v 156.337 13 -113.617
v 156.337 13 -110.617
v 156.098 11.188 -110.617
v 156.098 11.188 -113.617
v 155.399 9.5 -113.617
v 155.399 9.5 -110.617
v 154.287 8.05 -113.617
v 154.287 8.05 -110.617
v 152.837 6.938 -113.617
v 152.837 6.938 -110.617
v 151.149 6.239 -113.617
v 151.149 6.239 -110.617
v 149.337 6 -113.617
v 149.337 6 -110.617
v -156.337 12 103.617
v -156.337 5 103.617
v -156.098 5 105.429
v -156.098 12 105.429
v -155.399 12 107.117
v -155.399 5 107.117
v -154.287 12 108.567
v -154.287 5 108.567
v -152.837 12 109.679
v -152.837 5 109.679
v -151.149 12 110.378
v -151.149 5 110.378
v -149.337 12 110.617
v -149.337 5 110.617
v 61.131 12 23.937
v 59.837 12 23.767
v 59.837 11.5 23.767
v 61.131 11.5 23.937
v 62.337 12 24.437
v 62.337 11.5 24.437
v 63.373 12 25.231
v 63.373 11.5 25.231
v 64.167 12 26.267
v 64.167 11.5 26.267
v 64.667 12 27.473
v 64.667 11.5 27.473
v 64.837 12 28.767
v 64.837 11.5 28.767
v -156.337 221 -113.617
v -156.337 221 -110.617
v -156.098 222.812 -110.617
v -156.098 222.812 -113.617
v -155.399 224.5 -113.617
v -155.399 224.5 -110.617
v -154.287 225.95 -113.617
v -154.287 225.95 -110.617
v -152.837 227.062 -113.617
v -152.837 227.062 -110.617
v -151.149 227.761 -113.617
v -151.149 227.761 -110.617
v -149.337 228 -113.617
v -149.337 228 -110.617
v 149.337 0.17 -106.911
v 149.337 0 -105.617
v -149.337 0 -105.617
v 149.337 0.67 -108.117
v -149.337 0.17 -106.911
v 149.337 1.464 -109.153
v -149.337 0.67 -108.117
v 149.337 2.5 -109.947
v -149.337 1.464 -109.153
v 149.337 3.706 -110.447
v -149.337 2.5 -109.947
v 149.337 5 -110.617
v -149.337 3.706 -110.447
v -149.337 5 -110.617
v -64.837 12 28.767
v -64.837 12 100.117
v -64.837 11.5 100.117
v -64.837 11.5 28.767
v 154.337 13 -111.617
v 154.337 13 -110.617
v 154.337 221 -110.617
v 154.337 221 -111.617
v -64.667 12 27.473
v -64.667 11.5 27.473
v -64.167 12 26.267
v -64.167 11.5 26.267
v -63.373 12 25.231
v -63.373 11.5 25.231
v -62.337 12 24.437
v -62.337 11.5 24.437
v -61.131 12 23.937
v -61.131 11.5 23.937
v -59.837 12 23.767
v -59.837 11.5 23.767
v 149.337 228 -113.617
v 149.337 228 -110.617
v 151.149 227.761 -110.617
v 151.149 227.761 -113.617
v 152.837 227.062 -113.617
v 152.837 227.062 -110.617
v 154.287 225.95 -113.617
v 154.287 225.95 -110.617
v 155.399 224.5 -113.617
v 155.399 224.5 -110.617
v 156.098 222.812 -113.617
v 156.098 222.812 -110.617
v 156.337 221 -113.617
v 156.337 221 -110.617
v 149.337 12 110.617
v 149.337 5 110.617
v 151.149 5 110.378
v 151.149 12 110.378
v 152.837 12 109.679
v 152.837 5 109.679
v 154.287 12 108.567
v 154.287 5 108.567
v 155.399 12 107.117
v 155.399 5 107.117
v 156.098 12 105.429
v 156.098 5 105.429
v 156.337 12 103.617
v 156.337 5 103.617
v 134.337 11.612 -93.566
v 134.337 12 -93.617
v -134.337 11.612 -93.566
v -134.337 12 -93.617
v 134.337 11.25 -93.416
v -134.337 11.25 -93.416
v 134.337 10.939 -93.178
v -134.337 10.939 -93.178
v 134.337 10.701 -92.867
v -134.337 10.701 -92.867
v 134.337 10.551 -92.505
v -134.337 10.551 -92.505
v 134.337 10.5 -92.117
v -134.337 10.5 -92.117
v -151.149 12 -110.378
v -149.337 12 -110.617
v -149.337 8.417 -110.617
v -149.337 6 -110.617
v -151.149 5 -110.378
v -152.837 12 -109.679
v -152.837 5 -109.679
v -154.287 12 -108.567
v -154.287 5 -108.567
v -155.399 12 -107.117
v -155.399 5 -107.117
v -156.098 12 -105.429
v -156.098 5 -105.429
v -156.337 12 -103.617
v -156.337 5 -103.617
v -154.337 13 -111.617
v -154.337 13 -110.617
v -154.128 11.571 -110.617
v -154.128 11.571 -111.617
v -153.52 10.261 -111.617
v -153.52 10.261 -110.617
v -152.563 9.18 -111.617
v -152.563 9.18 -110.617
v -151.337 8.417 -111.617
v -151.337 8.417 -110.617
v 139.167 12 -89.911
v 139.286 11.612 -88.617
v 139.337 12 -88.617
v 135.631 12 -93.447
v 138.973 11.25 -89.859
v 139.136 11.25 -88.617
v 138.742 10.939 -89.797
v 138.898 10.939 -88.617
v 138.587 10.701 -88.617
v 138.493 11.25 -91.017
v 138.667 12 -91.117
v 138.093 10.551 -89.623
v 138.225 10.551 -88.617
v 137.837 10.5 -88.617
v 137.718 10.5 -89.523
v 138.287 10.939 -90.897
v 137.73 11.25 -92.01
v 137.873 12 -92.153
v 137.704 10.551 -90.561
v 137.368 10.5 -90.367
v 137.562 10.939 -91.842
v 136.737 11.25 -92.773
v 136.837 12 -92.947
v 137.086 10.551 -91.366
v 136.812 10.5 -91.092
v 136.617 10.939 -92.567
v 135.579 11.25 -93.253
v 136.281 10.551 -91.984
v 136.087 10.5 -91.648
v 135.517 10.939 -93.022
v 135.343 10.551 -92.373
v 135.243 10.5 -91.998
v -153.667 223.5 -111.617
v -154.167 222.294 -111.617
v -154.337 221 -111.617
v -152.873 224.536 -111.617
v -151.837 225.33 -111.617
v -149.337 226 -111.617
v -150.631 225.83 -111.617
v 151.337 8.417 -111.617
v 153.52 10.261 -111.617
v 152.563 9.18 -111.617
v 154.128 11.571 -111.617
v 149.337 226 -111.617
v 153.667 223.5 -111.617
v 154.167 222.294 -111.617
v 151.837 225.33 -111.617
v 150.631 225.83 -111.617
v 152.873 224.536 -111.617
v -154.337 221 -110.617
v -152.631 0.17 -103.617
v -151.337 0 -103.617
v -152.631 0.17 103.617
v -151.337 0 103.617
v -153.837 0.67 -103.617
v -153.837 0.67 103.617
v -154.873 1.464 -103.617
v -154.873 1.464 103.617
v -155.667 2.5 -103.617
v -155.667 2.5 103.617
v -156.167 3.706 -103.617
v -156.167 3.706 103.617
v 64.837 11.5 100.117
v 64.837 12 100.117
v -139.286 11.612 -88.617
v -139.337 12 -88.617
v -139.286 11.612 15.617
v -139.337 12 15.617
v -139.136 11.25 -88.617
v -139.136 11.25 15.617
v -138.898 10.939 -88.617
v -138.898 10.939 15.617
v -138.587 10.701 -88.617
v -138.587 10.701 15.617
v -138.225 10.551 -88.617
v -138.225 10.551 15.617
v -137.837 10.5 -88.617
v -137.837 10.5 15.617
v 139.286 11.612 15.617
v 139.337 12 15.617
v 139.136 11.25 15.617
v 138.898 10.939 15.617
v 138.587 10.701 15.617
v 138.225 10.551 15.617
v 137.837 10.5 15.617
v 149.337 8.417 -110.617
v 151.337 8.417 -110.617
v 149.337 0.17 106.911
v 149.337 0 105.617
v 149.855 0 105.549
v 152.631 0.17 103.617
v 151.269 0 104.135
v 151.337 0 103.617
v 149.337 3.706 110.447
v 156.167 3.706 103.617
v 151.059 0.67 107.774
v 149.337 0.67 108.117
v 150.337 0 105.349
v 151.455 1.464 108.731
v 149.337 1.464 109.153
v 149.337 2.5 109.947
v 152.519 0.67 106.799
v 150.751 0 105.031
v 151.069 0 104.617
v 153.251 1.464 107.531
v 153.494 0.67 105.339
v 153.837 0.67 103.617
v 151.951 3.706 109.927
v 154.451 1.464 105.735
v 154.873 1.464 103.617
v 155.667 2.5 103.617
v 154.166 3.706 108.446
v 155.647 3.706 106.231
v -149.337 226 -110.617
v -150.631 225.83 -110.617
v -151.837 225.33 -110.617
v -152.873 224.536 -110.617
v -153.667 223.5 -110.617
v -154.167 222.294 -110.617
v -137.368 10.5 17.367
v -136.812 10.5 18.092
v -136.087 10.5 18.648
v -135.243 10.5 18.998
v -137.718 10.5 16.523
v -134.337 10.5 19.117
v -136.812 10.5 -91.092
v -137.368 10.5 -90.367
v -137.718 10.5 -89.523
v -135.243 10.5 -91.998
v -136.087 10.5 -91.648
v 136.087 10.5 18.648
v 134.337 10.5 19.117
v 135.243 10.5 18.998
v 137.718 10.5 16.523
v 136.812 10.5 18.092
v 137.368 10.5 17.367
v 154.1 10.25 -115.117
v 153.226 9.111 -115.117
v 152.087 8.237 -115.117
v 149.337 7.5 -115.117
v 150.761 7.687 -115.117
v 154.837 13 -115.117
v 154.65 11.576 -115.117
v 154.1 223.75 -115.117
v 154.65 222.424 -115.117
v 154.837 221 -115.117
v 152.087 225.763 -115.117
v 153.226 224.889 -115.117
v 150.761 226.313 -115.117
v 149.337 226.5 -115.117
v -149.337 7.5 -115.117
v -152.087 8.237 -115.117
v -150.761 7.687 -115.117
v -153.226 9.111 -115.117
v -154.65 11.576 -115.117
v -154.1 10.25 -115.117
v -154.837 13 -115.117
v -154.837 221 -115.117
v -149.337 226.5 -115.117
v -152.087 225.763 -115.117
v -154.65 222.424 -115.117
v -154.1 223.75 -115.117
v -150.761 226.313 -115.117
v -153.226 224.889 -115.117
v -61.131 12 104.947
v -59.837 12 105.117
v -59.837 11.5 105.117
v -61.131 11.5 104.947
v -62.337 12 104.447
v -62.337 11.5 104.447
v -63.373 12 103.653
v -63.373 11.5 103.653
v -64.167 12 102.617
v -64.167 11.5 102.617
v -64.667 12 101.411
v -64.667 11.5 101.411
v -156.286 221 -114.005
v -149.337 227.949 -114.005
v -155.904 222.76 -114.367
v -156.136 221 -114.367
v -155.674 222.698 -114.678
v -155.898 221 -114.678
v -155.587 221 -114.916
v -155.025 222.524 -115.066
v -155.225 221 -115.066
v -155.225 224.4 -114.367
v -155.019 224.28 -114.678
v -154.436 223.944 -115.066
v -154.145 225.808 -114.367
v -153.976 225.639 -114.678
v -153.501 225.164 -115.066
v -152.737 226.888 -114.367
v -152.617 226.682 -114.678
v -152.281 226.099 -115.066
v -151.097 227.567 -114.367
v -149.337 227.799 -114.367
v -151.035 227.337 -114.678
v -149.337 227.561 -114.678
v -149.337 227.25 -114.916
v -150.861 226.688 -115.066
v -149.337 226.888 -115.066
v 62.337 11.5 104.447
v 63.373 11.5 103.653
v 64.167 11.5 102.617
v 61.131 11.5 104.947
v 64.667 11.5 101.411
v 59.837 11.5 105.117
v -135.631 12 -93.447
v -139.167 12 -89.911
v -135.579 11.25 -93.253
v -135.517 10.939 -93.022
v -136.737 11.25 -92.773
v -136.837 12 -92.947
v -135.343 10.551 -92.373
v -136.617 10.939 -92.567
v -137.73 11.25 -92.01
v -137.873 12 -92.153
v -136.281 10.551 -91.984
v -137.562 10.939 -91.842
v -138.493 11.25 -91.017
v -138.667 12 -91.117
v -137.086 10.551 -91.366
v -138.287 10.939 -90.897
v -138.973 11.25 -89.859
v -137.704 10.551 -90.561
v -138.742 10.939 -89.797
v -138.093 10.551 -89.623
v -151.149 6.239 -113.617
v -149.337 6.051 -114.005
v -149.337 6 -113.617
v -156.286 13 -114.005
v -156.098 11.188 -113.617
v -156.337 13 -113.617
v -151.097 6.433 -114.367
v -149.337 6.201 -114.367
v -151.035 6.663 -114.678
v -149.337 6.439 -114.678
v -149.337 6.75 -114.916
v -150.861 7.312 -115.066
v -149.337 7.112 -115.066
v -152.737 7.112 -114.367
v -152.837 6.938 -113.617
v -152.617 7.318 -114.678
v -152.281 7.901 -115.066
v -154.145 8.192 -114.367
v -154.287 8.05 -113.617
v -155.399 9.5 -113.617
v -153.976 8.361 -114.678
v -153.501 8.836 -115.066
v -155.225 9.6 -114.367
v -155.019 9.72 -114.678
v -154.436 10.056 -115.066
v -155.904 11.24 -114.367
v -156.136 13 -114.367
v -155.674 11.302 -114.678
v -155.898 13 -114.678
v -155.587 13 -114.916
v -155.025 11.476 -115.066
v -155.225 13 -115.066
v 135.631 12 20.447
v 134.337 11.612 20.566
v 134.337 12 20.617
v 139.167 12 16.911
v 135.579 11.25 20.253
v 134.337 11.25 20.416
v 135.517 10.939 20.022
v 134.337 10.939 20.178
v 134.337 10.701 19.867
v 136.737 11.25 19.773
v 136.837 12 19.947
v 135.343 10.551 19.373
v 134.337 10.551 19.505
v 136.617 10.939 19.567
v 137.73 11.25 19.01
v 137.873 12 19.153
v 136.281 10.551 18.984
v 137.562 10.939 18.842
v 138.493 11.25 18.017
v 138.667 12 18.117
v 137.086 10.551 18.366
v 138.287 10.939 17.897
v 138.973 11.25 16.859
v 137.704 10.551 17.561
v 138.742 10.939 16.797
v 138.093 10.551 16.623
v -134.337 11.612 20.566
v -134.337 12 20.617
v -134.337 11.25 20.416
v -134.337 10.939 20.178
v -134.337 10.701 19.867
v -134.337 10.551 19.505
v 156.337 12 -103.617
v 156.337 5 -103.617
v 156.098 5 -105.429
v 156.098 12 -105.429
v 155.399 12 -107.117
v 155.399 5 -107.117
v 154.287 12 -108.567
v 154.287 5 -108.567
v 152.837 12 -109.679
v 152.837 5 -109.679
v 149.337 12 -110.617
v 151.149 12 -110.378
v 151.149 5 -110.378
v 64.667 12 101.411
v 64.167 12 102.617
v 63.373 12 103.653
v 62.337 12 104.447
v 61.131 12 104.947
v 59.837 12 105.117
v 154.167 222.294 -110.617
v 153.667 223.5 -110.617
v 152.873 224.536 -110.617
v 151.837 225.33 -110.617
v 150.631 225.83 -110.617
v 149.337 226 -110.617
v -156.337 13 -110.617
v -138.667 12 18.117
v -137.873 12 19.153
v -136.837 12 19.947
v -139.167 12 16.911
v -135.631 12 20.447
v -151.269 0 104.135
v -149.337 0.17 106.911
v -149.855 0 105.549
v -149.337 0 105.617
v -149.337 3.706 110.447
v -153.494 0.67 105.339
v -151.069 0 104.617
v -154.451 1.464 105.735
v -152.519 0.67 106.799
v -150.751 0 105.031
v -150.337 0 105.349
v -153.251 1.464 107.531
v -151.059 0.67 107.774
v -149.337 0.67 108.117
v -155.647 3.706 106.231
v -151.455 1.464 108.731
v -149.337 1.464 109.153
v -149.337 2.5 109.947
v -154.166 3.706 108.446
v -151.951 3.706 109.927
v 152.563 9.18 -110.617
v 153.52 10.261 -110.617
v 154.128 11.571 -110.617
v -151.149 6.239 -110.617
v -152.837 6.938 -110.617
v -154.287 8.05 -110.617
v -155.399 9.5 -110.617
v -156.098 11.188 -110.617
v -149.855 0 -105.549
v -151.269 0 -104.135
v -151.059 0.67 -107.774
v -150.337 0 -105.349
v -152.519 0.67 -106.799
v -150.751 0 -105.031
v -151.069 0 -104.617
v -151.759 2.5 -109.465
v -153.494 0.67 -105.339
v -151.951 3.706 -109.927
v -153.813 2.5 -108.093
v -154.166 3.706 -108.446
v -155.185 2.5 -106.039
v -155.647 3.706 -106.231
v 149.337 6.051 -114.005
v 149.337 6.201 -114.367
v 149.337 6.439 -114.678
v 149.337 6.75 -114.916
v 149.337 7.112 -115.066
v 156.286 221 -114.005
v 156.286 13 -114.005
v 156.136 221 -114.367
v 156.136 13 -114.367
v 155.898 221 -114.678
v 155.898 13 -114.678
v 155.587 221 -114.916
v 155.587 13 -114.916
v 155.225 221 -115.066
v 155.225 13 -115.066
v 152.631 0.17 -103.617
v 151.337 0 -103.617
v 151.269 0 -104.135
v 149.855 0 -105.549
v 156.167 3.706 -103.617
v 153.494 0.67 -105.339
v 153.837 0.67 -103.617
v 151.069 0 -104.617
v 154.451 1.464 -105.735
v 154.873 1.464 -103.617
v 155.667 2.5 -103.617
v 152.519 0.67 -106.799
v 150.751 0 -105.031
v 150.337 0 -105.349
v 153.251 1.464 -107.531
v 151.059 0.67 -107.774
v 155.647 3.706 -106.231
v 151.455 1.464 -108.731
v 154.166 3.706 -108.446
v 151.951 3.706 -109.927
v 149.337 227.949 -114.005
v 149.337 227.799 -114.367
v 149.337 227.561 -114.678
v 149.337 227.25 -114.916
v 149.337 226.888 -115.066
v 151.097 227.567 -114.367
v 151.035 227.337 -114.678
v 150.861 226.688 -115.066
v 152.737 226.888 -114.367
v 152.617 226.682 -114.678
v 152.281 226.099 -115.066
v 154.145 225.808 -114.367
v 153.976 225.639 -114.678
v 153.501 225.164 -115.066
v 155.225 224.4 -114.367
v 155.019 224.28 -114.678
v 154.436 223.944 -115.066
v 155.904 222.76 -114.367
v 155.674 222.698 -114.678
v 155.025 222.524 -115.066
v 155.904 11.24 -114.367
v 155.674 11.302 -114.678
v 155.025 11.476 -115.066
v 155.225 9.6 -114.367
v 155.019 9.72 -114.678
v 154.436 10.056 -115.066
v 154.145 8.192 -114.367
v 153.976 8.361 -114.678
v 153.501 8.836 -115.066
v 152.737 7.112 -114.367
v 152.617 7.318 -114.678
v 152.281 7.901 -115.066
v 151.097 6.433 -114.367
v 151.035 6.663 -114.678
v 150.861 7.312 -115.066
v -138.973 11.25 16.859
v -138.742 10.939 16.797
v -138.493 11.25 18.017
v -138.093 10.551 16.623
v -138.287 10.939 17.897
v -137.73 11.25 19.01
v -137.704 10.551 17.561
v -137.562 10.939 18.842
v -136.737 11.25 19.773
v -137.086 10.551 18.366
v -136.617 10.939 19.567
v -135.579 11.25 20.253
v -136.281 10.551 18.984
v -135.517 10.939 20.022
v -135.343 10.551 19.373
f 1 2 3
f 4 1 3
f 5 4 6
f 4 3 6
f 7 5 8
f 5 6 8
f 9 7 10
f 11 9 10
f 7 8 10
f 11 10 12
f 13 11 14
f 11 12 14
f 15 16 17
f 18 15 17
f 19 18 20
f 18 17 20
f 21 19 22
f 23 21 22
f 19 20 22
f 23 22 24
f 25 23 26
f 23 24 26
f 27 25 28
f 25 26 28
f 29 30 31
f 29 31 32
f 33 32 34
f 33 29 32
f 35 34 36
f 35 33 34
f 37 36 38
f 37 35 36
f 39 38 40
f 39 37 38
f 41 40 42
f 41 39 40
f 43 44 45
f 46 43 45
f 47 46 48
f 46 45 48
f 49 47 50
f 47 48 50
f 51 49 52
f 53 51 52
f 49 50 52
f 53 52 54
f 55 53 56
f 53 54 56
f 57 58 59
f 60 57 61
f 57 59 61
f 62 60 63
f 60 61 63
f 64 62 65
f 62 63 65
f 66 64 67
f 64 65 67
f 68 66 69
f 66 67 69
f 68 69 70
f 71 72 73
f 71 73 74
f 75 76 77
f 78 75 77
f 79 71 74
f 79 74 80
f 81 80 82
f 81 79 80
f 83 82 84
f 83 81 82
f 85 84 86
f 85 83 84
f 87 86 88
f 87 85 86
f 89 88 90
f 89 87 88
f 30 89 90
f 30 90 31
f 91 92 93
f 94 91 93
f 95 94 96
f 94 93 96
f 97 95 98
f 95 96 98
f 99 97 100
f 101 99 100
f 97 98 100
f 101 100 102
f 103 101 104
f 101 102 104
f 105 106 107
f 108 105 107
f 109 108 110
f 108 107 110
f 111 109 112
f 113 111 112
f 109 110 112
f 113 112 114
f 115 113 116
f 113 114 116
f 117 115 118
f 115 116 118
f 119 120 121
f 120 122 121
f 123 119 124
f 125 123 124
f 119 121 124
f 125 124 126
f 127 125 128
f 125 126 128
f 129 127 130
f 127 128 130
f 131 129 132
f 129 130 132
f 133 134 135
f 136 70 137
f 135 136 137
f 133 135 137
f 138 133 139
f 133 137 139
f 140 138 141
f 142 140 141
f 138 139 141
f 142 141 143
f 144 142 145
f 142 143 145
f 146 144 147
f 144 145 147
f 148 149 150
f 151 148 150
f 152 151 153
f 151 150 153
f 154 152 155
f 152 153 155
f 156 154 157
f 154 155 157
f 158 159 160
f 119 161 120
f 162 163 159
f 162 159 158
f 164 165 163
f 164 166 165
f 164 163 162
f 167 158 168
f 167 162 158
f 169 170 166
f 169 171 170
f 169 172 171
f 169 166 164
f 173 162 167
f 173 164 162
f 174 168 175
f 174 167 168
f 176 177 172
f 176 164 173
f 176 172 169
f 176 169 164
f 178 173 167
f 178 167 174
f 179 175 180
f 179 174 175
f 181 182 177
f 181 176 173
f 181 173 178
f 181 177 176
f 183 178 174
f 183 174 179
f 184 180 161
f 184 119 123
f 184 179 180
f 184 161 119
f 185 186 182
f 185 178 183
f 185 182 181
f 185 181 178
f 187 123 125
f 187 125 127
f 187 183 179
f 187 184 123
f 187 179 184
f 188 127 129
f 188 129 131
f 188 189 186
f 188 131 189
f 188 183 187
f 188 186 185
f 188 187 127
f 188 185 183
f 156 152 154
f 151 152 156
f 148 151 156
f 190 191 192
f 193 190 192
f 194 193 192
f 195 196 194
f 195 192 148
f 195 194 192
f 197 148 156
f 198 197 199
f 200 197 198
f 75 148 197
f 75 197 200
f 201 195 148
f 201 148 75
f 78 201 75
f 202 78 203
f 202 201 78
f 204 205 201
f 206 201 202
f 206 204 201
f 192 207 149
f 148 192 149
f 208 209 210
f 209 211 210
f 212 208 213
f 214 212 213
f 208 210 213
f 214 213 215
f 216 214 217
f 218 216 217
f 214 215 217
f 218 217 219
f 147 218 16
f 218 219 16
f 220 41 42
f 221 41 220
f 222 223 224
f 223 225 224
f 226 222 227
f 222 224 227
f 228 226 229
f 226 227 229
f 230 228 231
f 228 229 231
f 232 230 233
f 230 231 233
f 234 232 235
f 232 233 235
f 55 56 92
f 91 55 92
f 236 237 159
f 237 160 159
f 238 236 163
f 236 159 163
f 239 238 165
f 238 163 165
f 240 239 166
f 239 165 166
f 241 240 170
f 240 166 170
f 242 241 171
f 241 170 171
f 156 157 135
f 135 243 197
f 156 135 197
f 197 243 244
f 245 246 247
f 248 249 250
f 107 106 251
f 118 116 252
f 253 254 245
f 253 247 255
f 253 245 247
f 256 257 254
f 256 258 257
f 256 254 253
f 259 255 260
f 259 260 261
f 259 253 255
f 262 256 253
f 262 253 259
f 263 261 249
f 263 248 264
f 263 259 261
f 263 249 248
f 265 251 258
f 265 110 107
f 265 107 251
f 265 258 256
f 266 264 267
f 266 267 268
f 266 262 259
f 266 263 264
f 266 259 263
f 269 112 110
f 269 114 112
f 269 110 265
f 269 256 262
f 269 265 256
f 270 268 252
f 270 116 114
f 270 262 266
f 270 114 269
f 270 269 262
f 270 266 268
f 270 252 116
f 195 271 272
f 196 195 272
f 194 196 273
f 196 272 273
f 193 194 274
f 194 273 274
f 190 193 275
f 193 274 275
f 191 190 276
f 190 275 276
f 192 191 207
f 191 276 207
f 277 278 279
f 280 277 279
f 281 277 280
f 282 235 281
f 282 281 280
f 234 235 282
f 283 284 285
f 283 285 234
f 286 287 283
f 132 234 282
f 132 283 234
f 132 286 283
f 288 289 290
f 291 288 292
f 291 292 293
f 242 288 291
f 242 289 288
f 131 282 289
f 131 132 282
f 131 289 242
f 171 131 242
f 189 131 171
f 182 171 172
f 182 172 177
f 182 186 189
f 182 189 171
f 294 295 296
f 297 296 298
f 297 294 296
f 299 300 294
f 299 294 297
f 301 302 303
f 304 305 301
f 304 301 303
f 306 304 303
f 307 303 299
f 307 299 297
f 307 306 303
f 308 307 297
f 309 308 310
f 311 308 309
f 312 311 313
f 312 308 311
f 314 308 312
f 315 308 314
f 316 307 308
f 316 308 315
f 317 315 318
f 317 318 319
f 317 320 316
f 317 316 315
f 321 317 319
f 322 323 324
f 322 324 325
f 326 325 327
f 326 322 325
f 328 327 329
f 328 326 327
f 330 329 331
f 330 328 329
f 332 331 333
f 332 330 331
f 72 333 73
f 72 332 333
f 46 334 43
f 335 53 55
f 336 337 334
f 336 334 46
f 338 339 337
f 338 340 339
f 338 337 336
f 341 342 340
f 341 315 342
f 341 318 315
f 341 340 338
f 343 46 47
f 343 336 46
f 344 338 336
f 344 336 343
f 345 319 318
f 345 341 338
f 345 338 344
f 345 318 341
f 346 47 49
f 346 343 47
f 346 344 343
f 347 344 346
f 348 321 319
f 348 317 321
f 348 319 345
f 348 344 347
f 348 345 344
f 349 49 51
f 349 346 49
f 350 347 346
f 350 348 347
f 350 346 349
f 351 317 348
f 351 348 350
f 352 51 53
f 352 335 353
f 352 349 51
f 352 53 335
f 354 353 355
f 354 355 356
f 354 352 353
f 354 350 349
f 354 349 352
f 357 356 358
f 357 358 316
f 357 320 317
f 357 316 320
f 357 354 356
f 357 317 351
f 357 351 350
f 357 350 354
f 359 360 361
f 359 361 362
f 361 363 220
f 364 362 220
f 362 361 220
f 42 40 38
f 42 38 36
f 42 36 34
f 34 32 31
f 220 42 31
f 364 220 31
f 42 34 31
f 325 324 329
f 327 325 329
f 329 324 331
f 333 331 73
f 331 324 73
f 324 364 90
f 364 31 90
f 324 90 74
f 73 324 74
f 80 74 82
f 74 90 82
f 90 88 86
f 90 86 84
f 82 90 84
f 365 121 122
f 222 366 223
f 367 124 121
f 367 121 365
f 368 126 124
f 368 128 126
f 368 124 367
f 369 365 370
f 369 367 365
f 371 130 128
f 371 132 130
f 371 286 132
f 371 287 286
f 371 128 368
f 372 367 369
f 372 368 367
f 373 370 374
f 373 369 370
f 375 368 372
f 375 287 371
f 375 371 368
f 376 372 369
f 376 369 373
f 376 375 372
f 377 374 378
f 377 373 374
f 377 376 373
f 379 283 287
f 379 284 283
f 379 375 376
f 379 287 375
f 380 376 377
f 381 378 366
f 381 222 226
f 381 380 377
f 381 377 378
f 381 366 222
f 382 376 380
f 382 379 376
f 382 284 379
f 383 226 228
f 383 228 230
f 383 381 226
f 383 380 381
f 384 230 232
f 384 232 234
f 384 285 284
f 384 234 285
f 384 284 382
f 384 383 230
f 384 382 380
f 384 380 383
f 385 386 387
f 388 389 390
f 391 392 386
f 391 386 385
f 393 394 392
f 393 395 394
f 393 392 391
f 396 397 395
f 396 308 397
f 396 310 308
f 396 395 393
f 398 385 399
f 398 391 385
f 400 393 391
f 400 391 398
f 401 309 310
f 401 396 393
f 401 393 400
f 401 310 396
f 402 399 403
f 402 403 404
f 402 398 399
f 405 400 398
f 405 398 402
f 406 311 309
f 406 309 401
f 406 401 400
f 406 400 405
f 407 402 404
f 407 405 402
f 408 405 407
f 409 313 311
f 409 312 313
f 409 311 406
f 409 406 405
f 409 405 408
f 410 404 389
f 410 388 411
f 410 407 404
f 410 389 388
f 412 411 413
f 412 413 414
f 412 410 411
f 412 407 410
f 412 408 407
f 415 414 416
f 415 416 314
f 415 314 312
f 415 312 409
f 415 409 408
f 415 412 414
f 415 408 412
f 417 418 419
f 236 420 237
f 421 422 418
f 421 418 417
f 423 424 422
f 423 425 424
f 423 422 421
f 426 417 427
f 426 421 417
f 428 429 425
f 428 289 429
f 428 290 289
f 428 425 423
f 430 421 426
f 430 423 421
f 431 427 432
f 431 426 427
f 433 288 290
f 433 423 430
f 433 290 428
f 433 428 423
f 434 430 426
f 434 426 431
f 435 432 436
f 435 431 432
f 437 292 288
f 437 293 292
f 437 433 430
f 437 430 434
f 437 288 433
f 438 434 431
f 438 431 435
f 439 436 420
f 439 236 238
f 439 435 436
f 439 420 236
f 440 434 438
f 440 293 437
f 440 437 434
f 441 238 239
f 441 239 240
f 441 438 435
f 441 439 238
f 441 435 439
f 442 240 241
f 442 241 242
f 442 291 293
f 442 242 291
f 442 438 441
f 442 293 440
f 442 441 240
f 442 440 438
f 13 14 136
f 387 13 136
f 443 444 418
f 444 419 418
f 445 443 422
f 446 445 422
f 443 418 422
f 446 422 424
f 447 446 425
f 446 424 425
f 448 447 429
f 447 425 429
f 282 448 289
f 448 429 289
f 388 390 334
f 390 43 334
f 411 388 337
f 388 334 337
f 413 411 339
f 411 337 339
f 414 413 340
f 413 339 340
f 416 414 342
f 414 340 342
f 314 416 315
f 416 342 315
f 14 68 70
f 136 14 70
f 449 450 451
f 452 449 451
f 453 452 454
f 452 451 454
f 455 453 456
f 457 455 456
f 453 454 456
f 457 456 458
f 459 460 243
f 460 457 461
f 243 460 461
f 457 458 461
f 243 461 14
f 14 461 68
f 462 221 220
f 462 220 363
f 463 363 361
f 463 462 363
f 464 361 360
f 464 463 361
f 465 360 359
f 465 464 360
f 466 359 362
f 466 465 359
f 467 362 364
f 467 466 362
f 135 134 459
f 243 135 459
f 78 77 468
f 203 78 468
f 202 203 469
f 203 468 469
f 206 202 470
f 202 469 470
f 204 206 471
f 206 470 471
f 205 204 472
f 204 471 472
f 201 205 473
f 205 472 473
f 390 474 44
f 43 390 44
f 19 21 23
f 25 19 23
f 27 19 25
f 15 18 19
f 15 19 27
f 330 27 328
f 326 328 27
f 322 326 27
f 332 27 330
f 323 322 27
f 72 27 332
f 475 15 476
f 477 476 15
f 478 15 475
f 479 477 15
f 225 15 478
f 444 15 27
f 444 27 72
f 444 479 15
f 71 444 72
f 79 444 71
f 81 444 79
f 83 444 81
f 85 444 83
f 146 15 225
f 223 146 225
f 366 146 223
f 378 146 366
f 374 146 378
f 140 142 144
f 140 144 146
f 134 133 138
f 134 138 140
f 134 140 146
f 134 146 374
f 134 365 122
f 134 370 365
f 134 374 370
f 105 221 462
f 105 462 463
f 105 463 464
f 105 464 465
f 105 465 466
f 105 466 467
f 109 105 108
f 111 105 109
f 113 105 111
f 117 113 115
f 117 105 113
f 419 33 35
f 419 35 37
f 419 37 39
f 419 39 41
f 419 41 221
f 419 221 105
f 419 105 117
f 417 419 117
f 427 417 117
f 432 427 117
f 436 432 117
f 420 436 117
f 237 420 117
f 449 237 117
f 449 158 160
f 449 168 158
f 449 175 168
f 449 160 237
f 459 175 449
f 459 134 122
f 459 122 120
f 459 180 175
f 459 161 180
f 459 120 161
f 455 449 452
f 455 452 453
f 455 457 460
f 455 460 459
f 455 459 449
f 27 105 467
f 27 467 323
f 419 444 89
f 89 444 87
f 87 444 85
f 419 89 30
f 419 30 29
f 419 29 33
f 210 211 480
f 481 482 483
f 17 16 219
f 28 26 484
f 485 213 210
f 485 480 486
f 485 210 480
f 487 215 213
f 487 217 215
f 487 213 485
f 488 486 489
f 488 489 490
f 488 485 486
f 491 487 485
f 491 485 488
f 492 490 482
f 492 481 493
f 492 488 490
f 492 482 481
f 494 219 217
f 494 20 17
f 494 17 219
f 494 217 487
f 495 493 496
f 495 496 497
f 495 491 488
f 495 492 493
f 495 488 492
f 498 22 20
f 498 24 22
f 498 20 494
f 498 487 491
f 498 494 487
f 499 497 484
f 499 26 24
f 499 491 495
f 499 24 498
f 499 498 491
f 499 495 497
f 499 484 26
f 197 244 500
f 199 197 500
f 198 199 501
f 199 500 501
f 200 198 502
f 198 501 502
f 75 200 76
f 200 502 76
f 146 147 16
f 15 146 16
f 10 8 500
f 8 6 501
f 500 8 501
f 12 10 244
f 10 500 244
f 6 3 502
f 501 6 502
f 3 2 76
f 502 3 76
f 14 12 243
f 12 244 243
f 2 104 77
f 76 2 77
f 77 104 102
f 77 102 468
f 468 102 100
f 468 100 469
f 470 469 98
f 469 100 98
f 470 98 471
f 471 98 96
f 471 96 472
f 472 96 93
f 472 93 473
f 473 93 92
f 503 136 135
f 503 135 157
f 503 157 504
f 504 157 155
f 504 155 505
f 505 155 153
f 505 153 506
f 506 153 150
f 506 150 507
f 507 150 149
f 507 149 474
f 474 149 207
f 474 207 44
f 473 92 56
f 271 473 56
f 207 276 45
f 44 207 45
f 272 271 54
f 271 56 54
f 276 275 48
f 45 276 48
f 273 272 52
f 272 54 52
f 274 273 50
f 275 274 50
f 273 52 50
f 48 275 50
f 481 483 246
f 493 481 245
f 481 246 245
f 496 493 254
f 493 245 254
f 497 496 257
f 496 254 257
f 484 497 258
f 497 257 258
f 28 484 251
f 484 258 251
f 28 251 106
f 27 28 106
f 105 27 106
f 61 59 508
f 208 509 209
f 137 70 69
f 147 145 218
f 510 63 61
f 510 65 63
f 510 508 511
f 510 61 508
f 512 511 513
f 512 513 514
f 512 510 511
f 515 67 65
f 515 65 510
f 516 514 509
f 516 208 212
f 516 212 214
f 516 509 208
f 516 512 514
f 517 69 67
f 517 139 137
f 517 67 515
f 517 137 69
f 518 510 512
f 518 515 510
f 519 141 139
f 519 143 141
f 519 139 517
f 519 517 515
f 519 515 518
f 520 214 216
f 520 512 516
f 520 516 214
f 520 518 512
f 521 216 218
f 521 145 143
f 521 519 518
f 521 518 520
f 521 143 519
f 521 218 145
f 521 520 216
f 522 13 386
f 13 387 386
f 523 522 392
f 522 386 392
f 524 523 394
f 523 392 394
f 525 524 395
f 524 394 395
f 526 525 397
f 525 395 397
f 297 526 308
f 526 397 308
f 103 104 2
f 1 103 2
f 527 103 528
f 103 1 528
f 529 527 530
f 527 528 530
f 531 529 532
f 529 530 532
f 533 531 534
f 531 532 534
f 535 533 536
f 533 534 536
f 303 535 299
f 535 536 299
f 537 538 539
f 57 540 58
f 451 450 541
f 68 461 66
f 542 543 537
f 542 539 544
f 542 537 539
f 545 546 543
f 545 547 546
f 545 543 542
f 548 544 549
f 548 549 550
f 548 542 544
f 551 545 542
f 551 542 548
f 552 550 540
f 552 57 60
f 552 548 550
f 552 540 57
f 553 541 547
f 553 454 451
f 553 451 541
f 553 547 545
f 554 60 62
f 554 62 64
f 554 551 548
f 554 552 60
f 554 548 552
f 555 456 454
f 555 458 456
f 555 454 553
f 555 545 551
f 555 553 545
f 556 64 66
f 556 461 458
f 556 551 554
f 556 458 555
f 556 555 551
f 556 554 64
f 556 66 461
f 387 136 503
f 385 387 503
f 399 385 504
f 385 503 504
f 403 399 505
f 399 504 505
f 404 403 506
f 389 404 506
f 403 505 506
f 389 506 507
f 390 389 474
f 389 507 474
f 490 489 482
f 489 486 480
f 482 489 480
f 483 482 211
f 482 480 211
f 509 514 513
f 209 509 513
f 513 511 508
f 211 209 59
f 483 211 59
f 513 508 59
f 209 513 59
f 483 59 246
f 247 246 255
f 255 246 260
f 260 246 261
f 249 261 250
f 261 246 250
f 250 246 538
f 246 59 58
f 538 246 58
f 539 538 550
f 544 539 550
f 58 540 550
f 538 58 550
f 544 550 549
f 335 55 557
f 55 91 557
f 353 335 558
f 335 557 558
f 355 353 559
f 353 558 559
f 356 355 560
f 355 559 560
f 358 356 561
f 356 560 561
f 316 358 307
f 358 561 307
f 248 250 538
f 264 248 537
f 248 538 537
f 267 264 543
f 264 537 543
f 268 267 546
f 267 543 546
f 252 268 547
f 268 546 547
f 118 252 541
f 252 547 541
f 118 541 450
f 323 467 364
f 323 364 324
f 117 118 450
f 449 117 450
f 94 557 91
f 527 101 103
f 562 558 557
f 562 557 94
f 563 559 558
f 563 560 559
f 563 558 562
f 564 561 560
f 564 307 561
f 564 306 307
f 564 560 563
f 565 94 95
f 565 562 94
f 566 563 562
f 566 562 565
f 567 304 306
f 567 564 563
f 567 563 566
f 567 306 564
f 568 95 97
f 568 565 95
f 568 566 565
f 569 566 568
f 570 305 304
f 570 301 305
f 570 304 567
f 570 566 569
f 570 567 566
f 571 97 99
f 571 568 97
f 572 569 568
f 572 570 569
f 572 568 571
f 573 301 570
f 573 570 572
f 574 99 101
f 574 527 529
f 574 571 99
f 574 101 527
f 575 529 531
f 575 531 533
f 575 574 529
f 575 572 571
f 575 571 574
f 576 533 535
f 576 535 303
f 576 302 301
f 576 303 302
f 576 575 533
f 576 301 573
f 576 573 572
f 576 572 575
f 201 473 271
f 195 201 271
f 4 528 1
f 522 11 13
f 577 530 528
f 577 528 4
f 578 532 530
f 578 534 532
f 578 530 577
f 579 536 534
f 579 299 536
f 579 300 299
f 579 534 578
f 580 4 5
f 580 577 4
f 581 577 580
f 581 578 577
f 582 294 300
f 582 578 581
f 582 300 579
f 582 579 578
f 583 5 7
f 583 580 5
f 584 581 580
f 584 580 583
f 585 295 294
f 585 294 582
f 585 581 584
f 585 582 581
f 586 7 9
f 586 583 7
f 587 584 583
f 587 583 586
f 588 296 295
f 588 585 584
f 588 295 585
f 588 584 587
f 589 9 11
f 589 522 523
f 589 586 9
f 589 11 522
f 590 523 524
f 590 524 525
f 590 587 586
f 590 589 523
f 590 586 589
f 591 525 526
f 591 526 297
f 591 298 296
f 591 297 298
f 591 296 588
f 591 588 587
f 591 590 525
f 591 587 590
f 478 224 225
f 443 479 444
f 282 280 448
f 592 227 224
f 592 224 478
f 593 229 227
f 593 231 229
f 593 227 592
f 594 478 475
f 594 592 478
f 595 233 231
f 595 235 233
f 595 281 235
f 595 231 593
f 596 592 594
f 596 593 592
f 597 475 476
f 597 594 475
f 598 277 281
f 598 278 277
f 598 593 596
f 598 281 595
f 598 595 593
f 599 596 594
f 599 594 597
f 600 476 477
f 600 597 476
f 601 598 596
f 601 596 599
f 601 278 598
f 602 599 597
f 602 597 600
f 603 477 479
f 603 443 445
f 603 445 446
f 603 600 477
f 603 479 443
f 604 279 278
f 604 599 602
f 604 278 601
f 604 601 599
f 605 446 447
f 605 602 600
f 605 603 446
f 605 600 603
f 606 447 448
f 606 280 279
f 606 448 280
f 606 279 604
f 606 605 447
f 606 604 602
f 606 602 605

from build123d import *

# Parameters (mm, degrees)
BOSS_EXTRUDE1_DEPTH = 12
BOSS_EXTRUDE2_DEPTH = 4.5
FILLET1_R           = 5
FILLET2_R           = 1.5
CUT_EXTRUDE1_DEPTH  = 1
CUT_EXTRUDE2_DEPTH  = 1.5
CUT_EXTRUDE3_DEPTH  = 0.5
FILLET3_R           = 1.5


with BuildPart() as part:
    # Sketch1 → Boss-Extrude1 (new body)
    with BuildSketch(Plane(origin=(0, 0, 0), x_dir=(1, 0, 0), z_dir=(0, 1, 0))):
        with BuildLine():
            Line((-149.337, -110.617), (149.337, -110.617))
            ThreePointArc((149.337, -110.617), (154.286747468, -108.566747468), (156.337, -103.617))
            Line((156.337, -103.617), (156.337, 103.617))
            ThreePointArc((156.337, 103.617), (154.286747468, 108.566747468), (149.337, 110.617))
            Line((149.337, 110.617), (-149.337, 110.617))
            ThreePointArc((-149.337, 110.617), (-154.286747468, 108.566747468), (-156.337, 103.617))
            Line((-156.337, 103.617), (-156.337, -103.617))
            ThreePointArc((-156.337, -103.617), (-154.286747468, -108.566747468), (-149.337, -110.617))
        make_face()
    extrude(amount=BOSS_EXTRUDE1_DEPTH)

    # Sketch2 → Boss-Extrude2 (add)
    with BuildSketch(Plane(origin=(0, 0, -110.617), x_dir=(-1, 0, 0), z_dir=(0, 0, -1))):
        with BuildLine():
            Line((-149.337, 6), (149.337, 6))
            ThreePointArc((149.337, 6), (154.286747468, 8.050252532), (156.337, 13))
            Line((156.337, 13), (156.337, 221))
            ThreePointArc((156.337, 221), (154.286747468, 225.949747468), (149.337, 228))
            Line((149.337, 228), (-149.337, 228))
            ThreePointArc((-149.337, 228), (-154.286747468, 225.949747468), (-156.337, 221))
            Line((-156.337, 221), (-156.337, 13))
            ThreePointArc((-156.337, 13), (-154.286747468, 8.050252532), (-149.337, 6))
        make_face()
    extrude(amount=BOSS_EXTRUDE2_DEPTH)

    # Fillet1
    fillet1_edges = [part.edges().sort_by_distance(p)[0] for p in [
        (-156.337, 0, 0),
        (-154.286747468, 0, -108.566747468),
        (0, 0, -110.617),
        (154.286747468, 0, -108.566747468),
        (156.337, 0, 0),
        (154.286747468, 0, 108.566747468),
        (0, 0, 110.617),
        (-154.286747468, 0, 108.566747468),
    ]]
    fillet(fillet1_edges, radius=FILLET1_R)

    # Fillet2
    fillet2_edges = [part.edges().sort_by_distance(p)[0] for p in [
        (154.286747468, 8.050252532, -115.117),
        (0, 6, -115.117),
        (-154.286747468, 8.050252532, -115.117),
        (-156.337, 117, -115.117),
        (-154.286747468, 225.949747468, -115.117),
        (0, 228, -115.117),
        (154.286747468, 225.949747468, -115.117),
        (156.337, 117, -115.117),
    ]]
    fillet(fillet2_edges, radius=FILLET2_R)

    # Sketch3 → Cut-Extrude1 (cut)
    with BuildSketch(Plane.XY.offset(-110.617)):
        with BuildLine():
            Line((-151.337, 8.417424305), (151.337, 8.417424305))
            ThreePointArc((151.337, 8.417424305), (153.520300133, 10.261387212), (154.337, 13))
            Line((154.337, 13), (154.337, 221))
            ThreePointArc((154.337, 221), (152.872533906, 224.535533906), (149.337, 226))
            Line((149.337, 226), (-149.337, 226))
            ThreePointArc((-149.337, 226), (-152.872533906, 224.535533906), (-154.337, 221))
            Line((-154.337, 221), (-154.337, 13))
            ThreePointArc((-154.337, 13), (-153.520300133, 10.261387212), (-151.337, 8.417424305))
        make_face()
    extrude(amount=-CUT_EXTRUDE1_DEPTH, mode=Mode.SUBTRACT)

    # Sketch4 → Cut-Extrude2 (cut)
    with BuildSketch(Plane(origin=(0, 12, 0), x_dir=(1, 0, 0), z_dir=(0, 1, 0))):
        with BuildLine():
            Line((-134.337, -20.617), (134.337, -20.617))
            ThreePointArc((134.337, -20.617), (137.872533906, -19.152533906), (139.337, -15.617))
            Line((139.337, -15.617), (139.337, 88.617))
            ThreePointArc((139.337, 88.617), (137.872533906, 92.152533906), (134.337, 93.617))
            Line((134.337, 93.617), (-134.337, 93.617))
            ThreePointArc((-134.337, 93.617), (-137.872533906, 92.152533906), (-139.337, 88.617))
            Line((-139.337, 88.617), (-139.337, -15.617))
            ThreePointArc((-139.337, -15.617), (-137.872533906, -19.152533906), (-134.337, -20.617))
        make_face()
    extrude(amount=-CUT_EXTRUDE2_DEPTH, mode=Mode.SUBTRACT)

    # Sketch4<3> → Cut-Extrude3 (cut)
    with BuildSketch(Plane(origin=(0, 12, 0), x_dir=(1, 0, 0), z_dir=(0, 1, 0))):
        with BuildLine():
            Line((-59.837, -23.767), (59.837, -23.767))
            ThreePointArc((59.837, -23.767), (63.372533906, -25.231466094), (64.837, -28.767))
            Line((64.837, -28.767), (64.837, -100.117))
            ThreePointArc((64.837, -100.117), (63.372533906, -103.652533906), (59.837, -105.117))
            Line((59.837, -105.117), (-59.837, -105.117))
            ThreePointArc((-59.837, -105.117), (-63.372533906, -103.652533906), (-64.837, -100.117))
            Line((-64.837, -100.117), (-64.837, -28.767))
            ThreePointArc((-64.837, -28.767), (-63.372533906, -25.231466094), (-59.837, -23.767))
        make_face()
    extrude(amount=-CUT_EXTRUDE3_DEPTH, mode=Mode.SUBTRACT)

    # Fillet3
    fillet3_edges = [part.edges().sort_by_distance(p)[0] for p in [
        (-137.872533906, 10.5, -92.152533906),
        (-139.337, 10.5, -36.5),
        (-137.872533906, 10.5, 19.152533906),
        (0, 10.5, 20.617),
        (137.872533906, 10.5, 19.152533906),
        (139.337, 10.5, -36.5),
        (137.872533906, 10.5, -92.152533906),
        (0, 10.5, -93.617),
    ]]
    fillet(fillet3_edges, radius=FILLET3_R - 0.0001)  # a hair under: the kernel refuses the full size


solid = part.part
